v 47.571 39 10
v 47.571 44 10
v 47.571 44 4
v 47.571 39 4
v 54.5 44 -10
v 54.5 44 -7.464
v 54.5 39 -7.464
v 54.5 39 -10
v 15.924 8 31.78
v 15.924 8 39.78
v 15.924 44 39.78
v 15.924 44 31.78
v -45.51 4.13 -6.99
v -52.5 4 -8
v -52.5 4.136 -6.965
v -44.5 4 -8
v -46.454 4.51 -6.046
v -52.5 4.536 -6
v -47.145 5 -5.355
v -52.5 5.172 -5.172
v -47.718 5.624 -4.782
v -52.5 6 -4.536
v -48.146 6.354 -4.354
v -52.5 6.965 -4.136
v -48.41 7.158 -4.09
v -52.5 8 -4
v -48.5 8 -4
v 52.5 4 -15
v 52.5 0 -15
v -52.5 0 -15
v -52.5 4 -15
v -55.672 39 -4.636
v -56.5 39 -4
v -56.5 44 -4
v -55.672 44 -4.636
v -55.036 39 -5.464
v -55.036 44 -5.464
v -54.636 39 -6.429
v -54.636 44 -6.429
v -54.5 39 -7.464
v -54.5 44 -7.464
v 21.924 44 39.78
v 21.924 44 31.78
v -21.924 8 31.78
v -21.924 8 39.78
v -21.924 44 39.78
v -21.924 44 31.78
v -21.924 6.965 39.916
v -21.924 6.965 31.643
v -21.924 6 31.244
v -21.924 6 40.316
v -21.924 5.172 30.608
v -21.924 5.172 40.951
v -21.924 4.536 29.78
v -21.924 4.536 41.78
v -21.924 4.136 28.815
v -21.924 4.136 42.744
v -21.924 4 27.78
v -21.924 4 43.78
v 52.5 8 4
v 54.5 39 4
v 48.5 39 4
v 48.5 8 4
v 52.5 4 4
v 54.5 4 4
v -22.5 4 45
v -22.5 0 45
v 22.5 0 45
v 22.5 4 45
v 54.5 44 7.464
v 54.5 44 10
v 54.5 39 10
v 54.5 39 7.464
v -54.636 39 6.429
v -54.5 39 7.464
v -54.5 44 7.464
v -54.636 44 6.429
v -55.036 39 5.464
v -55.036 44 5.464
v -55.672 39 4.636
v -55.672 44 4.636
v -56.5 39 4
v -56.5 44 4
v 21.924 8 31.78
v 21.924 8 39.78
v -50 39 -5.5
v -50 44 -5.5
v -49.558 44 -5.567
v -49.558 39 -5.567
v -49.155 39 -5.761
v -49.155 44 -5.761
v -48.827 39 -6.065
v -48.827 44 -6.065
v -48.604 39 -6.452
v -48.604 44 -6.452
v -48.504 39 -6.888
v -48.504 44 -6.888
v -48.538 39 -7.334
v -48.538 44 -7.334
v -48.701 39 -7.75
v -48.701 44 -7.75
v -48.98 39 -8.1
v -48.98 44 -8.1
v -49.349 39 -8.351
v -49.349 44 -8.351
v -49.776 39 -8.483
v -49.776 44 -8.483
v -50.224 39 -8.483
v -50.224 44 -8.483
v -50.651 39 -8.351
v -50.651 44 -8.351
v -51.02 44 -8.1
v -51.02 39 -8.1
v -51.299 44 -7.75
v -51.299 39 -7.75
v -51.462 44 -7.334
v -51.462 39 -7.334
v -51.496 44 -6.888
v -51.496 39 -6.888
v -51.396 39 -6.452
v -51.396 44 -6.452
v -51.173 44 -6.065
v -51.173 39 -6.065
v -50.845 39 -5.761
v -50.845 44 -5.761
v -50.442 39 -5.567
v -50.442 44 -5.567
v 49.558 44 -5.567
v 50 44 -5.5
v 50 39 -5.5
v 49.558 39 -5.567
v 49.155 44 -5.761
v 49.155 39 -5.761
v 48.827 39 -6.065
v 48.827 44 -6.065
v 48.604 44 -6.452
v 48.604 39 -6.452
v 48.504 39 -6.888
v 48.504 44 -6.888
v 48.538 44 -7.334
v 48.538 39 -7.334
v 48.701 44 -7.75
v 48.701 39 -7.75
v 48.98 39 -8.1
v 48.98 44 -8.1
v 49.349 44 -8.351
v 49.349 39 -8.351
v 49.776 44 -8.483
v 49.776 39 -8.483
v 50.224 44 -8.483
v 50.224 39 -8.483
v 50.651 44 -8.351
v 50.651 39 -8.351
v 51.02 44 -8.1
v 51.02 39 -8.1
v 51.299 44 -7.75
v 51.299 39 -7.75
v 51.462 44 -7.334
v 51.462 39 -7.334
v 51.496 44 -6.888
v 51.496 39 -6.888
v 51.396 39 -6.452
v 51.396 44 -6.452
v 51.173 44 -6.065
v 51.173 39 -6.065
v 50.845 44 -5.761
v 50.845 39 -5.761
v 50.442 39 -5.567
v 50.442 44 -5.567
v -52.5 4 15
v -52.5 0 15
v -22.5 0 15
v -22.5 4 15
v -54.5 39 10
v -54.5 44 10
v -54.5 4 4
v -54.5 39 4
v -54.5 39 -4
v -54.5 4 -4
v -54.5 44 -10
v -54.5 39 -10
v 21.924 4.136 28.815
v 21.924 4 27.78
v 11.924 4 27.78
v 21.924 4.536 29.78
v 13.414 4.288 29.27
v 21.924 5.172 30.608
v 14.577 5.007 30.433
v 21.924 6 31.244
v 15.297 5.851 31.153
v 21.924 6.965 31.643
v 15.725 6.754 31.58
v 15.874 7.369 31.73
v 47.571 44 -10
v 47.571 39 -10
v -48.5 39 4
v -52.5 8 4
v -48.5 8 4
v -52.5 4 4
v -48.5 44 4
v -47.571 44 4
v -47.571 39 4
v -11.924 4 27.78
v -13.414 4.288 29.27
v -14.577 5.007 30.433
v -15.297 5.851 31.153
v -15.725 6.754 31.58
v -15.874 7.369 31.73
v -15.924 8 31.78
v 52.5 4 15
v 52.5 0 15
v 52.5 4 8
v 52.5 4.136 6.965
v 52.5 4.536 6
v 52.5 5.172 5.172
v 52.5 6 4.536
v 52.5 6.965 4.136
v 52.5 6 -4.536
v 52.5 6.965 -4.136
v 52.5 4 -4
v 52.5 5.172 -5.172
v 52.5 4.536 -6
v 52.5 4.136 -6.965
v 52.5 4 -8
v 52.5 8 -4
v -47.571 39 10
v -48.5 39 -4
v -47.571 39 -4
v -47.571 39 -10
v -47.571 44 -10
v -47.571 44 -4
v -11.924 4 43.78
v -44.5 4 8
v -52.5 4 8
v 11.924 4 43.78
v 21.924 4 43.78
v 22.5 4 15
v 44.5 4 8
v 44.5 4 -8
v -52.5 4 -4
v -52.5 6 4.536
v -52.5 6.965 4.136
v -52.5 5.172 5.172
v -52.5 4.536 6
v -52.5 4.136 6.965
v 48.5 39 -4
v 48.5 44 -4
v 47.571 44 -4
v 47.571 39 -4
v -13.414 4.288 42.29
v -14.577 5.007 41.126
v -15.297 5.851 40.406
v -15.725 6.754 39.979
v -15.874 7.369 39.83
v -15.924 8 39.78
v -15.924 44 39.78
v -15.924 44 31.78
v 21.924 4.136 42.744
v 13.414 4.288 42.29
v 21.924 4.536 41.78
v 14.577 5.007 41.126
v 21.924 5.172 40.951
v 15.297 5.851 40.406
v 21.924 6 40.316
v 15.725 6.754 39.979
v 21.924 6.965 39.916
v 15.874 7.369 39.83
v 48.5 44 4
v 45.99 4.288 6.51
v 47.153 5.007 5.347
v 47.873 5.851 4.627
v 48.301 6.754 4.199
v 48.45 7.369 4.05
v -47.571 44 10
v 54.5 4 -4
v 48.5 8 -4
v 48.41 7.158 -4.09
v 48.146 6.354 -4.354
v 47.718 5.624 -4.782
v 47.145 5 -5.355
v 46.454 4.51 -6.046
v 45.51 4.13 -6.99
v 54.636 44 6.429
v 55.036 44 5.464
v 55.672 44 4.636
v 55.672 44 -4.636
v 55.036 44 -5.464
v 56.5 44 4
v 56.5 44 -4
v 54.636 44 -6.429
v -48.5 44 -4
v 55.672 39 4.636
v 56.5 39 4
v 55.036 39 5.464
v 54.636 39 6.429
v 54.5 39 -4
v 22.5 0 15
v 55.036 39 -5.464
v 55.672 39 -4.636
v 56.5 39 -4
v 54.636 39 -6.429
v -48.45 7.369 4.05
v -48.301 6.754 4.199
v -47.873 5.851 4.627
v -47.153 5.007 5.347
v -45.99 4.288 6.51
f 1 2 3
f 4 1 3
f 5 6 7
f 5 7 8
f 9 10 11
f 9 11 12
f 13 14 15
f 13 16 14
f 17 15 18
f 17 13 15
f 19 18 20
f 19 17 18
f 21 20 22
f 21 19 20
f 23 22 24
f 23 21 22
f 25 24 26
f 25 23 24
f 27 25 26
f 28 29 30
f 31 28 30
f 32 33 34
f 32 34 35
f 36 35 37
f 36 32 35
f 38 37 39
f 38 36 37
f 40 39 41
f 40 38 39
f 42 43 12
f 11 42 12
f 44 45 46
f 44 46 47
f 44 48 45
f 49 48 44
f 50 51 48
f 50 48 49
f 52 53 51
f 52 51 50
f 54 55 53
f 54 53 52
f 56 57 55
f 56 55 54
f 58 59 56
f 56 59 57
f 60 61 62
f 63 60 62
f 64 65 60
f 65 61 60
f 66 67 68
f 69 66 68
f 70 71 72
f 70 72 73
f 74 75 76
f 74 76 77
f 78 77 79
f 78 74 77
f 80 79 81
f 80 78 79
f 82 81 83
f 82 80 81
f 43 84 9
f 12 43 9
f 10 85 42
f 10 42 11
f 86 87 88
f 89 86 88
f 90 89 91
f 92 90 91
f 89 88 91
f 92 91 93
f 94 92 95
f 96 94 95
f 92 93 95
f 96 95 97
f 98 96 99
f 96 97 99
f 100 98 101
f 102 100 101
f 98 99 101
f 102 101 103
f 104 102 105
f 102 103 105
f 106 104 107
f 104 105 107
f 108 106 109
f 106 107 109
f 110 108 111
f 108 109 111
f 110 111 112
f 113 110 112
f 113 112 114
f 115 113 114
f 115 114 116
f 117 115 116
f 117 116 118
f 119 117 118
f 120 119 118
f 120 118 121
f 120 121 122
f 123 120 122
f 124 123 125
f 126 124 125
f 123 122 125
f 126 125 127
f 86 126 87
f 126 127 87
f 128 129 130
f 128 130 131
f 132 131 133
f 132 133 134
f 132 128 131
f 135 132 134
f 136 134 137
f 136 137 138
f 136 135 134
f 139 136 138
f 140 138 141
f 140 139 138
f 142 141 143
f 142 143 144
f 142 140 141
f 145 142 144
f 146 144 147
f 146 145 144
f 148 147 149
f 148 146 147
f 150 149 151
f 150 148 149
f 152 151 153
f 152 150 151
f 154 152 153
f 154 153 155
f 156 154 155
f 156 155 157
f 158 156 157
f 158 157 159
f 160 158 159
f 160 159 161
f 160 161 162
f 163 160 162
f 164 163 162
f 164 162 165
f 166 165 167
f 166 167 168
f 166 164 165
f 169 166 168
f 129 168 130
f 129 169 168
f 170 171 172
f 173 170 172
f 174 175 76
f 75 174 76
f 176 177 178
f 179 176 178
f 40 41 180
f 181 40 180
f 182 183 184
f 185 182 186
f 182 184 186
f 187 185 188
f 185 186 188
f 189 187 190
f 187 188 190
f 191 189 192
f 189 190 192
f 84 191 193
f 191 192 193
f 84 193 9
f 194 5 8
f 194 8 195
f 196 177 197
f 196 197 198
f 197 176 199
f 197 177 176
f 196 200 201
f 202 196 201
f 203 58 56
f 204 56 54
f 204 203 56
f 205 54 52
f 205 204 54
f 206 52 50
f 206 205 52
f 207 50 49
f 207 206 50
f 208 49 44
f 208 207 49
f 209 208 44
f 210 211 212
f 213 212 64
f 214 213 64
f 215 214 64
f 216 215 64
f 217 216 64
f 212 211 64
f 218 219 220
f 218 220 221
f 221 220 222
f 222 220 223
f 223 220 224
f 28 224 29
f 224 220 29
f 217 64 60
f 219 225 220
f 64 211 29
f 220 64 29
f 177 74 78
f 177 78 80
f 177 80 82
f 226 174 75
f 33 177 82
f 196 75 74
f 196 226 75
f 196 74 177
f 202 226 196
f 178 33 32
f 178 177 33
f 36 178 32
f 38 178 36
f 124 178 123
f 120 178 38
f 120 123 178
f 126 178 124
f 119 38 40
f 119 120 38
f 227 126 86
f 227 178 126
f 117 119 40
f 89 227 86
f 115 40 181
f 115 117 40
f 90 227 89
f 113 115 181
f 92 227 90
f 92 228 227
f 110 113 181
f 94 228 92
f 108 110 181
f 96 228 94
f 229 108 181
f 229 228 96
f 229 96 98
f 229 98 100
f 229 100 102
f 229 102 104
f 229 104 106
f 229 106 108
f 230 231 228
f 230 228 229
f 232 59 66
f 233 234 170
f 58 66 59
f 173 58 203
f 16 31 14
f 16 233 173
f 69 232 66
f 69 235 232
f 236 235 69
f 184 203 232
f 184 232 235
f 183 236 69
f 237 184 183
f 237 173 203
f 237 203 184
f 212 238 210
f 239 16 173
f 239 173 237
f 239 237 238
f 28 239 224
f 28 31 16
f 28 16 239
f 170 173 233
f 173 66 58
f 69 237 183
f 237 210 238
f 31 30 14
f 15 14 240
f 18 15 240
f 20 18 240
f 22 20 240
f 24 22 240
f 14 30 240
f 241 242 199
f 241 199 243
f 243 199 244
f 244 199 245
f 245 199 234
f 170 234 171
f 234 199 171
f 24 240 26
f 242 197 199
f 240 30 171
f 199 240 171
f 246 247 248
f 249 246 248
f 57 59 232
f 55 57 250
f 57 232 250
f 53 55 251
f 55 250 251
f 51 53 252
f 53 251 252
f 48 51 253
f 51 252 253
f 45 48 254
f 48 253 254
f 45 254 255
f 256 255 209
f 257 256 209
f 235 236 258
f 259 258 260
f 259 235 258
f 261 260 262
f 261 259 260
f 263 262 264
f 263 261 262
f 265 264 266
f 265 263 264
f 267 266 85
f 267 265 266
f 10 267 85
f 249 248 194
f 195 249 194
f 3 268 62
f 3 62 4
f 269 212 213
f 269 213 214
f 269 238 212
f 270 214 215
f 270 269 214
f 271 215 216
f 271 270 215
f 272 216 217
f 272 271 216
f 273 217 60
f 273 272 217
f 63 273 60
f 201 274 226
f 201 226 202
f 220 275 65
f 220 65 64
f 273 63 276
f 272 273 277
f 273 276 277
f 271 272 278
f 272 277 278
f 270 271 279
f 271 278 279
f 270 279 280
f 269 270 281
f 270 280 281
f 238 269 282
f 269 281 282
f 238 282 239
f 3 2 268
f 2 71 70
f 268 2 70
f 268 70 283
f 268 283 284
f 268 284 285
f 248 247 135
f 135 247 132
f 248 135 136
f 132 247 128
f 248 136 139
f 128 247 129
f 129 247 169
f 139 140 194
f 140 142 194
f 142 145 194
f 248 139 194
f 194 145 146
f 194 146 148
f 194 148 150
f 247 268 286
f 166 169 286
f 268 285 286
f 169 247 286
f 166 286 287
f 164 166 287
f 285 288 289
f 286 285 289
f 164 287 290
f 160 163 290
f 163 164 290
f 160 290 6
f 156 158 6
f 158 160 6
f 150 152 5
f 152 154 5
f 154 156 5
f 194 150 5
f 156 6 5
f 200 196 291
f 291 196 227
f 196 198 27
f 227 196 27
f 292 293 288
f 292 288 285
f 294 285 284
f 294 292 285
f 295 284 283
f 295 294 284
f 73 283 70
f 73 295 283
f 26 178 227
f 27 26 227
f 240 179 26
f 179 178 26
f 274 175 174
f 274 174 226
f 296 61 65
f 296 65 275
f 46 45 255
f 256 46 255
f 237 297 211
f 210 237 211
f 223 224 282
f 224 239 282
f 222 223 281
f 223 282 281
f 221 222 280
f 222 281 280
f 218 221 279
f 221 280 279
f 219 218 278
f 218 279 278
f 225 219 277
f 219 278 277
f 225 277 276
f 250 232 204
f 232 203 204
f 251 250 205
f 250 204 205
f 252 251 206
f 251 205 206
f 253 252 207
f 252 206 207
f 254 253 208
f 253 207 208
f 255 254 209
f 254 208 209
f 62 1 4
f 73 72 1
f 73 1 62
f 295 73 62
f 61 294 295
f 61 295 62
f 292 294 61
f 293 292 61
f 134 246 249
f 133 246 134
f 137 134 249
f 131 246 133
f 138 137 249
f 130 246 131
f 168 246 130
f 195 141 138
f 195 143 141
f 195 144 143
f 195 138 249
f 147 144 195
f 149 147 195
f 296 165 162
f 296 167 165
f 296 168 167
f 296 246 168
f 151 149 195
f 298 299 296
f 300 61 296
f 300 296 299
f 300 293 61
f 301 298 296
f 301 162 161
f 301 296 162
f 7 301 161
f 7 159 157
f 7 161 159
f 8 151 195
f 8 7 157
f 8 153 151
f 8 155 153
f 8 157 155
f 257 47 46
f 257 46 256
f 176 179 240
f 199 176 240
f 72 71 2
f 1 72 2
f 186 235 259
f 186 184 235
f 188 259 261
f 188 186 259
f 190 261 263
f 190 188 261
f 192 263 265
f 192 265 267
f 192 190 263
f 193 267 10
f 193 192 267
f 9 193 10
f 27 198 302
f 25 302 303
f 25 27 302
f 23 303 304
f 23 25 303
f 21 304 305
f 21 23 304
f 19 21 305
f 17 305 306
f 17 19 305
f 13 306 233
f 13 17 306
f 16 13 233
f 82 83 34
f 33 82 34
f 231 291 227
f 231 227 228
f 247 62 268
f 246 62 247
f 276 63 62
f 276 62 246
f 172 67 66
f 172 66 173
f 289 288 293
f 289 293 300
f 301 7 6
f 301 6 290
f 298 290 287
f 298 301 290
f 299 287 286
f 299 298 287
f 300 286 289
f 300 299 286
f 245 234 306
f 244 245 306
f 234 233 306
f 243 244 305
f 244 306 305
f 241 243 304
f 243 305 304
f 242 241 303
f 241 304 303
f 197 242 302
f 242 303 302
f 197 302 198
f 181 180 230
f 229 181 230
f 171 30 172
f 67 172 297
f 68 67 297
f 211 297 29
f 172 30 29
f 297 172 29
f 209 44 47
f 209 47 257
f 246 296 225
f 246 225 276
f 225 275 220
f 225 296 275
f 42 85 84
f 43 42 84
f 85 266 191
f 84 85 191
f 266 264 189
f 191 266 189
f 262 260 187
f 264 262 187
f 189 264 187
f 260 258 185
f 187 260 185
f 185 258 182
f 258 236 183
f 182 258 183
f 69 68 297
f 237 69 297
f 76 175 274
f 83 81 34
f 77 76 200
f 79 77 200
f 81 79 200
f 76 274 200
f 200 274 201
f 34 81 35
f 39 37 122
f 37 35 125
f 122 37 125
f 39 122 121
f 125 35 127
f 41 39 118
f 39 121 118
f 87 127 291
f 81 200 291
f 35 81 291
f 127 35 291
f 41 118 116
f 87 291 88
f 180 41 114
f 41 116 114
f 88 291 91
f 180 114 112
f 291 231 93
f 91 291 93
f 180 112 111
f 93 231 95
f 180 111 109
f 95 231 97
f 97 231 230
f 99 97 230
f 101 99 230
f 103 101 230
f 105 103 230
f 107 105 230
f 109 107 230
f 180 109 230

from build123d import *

# Parameters (mm, degrees)
SKETCH1_W            = 45
SKETCH1_H            = 30
BOSS_EXTRUDE1_DEPTH  = 4
SKETCH2_W            = 6
SKETCH2_H            = 8
BOSS_EXTRUDE2_DEPTH  = 40
SKETCH3_W            = 6.928859687
SKETCH3_H            = 6
SKETCH3_R            = 1.5
SKETCH3_W_2          = 2
SKETCH3_H_2          = 8
BOSS_EXTRUDE3_DEPTH  = 5
FILLET2_R            = 4
FILLET3_R            = 4
FILLET2_OF_MIRROR2_R = 4
FILLET3_OF_MIRROR2_R = 4


with BuildPart() as part:
    # Sketch1 → Boss-Extrude1 (new body)
    with BuildSketch(Plane(origin=(0, 0, 0), x_dir=(1, 0, 0), z_dir=(0, 1, 0))):
        Polygon((-22.5, -15), (22.5, -15), (52.5, -15), (52.5, 15), (-52.5, 15), (-52.5, -15), align=None)
        with Locations((0, -30)):
            Rectangle(SKETCH1_W, SKETCH1_H)
    extrude(amount=BOSS_EXTRUDE1_DEPTH)

    # Sketch2 → Boss-Extrude2 (add)
    with BuildSketch(Plane(origin=(0, 4, 0), x_dir=(1, 0, 0), z_dir=(0, 1, 0))):
        with Locations((-51.5, 0)):
            Rectangle(SKETCH2_W, SKETCH2_H)
        with Locations((-18.923893187, -35.779603492)):
            Rectangle(SKETCH2_W, SKETCH2_H)
    boss_extrude2 = extrude(amount=BOSS_EXTRUDE2_DEPTH)

    # Sketch3 → Boss-Extrude3 (add)
    # profile 1 of 3: a face of its own
    with BuildSketch(Plane(origin=(0, 44, 0), x_dir=(1, 0, 0), z_dir=(0, 1, 0))):
        with Locations((-51.035570157, 7)):
            Rectangle(SKETCH3_W, SKETCH3_H)
        with Locations(Location((-50, 7, 0), (0, 0, 270))):
            Circle(SKETCH3_R, mode=Mode.SUBTRACT)
    # profile 2 of 3: a face of its own
    with BuildSketch(Plane(origin=(0, 44, 0), x_dir=(1, 0, 0), z_dir=(0, 1, 0))):
        with Locations((-55.5, 0)):
            Rectangle(SKETCH3_W_2, SKETCH3_H_2)
    # profile 3 of 3: a face of its own
    with BuildSketch(Plane(origin=(0, 44, 0), x_dir=(1, 0, 0), z_dir=(0, 1, 0))):
        with Locations((-51.035570157, -7)):
            Rectangle(SKETCH3_W, SKETCH3_H)
    boss_extrude3 = extrude(amount=-BOSS_EXTRUDE3_DEPTH)

    # Fillet2
    # the kernel refuses this fillet: 4 mm, written as the material it adds along each edge
    with BuildSketch(Plane(origin=(-54.5, 39, -4), x_dir=(0, 0, -1), z_dir=(0, 1, 0))) as fillet2_piece_1:
        with BuildLine():
            CenterArc((3.464101615, 4), FILLET2_R, 210, 60)
            Line((0, 2), (-0.069282032, 1.96))
            ThreePointArc((-0.069282032, 1.96), (-0.08, 1), (-0.08, 0))
            Line((-0.08, 0), (0, -0.08))
            Line((0, -0.08), (3.464101615, -0.08))
            Line((3.464101615, -0.08), (3.464101615, 0))
        make_face()
    extrude(amount=5)
    with BuildSketch(Plane(origin=(-54.5, 39, 4), x_dir=(0, 0, 1), z_dir=(0, 1, 0))) as fillet2_piece_2:
        with BuildLine():
            CenterArc((3.464101615, -4), FILLET2_R, 90, 60)
            Line((0, -2), (-0.069282032, -1.96))
            ThreePointArc((-0.069282032, -1.96), (-0.08, -1), (-0.08, 0))
            Line((-0.08, 0), (0, 0.08))
            Line((0, 0.08), (3.464101615, 0.08))
            Line((3.464101615, 0.08), (3.464101615, 0))
        make_face()
    extrude(amount=5)

    # Fillet3
    fillet3_edges = [part.edges().sort_by_distance(p)[0] for p in [
        (-50.5, 4, 4),
        (-48.5, 4, 0),
        (-50.5, 4, -4),
        (-15.923893187, 4, 35.779603492),
        (-18.923893187, 4, 31.779603492),
        (-18.923893187, 4, 39.779603492),
    ]]
    fillet(fillet3_edges, radius=FILLET3_R)

    # Mirror2: Boss-Extrude2, Boss-Extrude3 across plane
    add(boss_extrude2.mirror(Plane(origin=(0, 0, 0), x_dir=(0, 0, 1), z_dir=(1, 0, 0))))
    add(boss_extrude3.mirror(Plane(origin=(0, 0, 0), x_dir=(0, 0, 1), z_dir=(1, 0, 0))))

    # Fillet2 of Mirror2
    # the kernel refuses this fillet: 4 mm, written as the material it adds along each edge
    with BuildSketch(Plane(origin=(54.5, 39, -4), x_dir=(0, 0, -1), z_dir=(0, 1, 0))) as fillet2_of_mirror2_piece_1:
        with BuildLine():
            CenterArc((3.464101615, -4), FILLET2_OF_MIRROR2_R, 90, 60)
            Line((0, -2), (-0.069282032, -1.96))
            ThreePointArc((-0.069282032, -1.96), (-0.08, -1), (-0.08, 0))
            Line((-0.08, 0), (0, 0.08))
            Line((0, 0.08), (3.464101615, 0.08))
            Line((3.464101615, 0.08), (3.464101615, 0))
        make_face()
    extrude(amount=5)
    with BuildSketch(Plane(origin=(54.5, 39, 4), x_dir=(0, 0, 1), z_dir=(0, 1, 0))) as fillet2_of_mirror2_piece_2:
        with BuildLine():
            CenterArc((3.464101615, 4), FILLET2_OF_MIRROR2_R, 210, 60)
            Line((0, 2), (-0.069282032, 1.96))
            ThreePointArc((-0.069282032, 1.96), (-0.08, 1), (-0.08, 0))
            Line((-0.08, 0), (0, -0.08))
            Line((0, -0.08), (3.464101615, -0.08))
            Line((3.464101615, -0.08), (3.464101615, 0))
        make_face()
    extrude(amount=5)

    # Fillet3 of Mirror2
    fillet3_of_mirror2_edges = [part.edges().sort_by_distance(p)[0] for p in [
        (50.5, 4, 4),
        (48.5, 4, 0),
        (50.5, 4, -4),
        (15.923893187, 4, 35.779603492),
        (18.923893187, 4, 31.779603492),
        (18.923893187, 4, 39.779603492),
    ]]
    fillet(fillet3_of_mirror2_edges, radius=FILLET3_OF_MIRROR2_R)


solid = part.part
